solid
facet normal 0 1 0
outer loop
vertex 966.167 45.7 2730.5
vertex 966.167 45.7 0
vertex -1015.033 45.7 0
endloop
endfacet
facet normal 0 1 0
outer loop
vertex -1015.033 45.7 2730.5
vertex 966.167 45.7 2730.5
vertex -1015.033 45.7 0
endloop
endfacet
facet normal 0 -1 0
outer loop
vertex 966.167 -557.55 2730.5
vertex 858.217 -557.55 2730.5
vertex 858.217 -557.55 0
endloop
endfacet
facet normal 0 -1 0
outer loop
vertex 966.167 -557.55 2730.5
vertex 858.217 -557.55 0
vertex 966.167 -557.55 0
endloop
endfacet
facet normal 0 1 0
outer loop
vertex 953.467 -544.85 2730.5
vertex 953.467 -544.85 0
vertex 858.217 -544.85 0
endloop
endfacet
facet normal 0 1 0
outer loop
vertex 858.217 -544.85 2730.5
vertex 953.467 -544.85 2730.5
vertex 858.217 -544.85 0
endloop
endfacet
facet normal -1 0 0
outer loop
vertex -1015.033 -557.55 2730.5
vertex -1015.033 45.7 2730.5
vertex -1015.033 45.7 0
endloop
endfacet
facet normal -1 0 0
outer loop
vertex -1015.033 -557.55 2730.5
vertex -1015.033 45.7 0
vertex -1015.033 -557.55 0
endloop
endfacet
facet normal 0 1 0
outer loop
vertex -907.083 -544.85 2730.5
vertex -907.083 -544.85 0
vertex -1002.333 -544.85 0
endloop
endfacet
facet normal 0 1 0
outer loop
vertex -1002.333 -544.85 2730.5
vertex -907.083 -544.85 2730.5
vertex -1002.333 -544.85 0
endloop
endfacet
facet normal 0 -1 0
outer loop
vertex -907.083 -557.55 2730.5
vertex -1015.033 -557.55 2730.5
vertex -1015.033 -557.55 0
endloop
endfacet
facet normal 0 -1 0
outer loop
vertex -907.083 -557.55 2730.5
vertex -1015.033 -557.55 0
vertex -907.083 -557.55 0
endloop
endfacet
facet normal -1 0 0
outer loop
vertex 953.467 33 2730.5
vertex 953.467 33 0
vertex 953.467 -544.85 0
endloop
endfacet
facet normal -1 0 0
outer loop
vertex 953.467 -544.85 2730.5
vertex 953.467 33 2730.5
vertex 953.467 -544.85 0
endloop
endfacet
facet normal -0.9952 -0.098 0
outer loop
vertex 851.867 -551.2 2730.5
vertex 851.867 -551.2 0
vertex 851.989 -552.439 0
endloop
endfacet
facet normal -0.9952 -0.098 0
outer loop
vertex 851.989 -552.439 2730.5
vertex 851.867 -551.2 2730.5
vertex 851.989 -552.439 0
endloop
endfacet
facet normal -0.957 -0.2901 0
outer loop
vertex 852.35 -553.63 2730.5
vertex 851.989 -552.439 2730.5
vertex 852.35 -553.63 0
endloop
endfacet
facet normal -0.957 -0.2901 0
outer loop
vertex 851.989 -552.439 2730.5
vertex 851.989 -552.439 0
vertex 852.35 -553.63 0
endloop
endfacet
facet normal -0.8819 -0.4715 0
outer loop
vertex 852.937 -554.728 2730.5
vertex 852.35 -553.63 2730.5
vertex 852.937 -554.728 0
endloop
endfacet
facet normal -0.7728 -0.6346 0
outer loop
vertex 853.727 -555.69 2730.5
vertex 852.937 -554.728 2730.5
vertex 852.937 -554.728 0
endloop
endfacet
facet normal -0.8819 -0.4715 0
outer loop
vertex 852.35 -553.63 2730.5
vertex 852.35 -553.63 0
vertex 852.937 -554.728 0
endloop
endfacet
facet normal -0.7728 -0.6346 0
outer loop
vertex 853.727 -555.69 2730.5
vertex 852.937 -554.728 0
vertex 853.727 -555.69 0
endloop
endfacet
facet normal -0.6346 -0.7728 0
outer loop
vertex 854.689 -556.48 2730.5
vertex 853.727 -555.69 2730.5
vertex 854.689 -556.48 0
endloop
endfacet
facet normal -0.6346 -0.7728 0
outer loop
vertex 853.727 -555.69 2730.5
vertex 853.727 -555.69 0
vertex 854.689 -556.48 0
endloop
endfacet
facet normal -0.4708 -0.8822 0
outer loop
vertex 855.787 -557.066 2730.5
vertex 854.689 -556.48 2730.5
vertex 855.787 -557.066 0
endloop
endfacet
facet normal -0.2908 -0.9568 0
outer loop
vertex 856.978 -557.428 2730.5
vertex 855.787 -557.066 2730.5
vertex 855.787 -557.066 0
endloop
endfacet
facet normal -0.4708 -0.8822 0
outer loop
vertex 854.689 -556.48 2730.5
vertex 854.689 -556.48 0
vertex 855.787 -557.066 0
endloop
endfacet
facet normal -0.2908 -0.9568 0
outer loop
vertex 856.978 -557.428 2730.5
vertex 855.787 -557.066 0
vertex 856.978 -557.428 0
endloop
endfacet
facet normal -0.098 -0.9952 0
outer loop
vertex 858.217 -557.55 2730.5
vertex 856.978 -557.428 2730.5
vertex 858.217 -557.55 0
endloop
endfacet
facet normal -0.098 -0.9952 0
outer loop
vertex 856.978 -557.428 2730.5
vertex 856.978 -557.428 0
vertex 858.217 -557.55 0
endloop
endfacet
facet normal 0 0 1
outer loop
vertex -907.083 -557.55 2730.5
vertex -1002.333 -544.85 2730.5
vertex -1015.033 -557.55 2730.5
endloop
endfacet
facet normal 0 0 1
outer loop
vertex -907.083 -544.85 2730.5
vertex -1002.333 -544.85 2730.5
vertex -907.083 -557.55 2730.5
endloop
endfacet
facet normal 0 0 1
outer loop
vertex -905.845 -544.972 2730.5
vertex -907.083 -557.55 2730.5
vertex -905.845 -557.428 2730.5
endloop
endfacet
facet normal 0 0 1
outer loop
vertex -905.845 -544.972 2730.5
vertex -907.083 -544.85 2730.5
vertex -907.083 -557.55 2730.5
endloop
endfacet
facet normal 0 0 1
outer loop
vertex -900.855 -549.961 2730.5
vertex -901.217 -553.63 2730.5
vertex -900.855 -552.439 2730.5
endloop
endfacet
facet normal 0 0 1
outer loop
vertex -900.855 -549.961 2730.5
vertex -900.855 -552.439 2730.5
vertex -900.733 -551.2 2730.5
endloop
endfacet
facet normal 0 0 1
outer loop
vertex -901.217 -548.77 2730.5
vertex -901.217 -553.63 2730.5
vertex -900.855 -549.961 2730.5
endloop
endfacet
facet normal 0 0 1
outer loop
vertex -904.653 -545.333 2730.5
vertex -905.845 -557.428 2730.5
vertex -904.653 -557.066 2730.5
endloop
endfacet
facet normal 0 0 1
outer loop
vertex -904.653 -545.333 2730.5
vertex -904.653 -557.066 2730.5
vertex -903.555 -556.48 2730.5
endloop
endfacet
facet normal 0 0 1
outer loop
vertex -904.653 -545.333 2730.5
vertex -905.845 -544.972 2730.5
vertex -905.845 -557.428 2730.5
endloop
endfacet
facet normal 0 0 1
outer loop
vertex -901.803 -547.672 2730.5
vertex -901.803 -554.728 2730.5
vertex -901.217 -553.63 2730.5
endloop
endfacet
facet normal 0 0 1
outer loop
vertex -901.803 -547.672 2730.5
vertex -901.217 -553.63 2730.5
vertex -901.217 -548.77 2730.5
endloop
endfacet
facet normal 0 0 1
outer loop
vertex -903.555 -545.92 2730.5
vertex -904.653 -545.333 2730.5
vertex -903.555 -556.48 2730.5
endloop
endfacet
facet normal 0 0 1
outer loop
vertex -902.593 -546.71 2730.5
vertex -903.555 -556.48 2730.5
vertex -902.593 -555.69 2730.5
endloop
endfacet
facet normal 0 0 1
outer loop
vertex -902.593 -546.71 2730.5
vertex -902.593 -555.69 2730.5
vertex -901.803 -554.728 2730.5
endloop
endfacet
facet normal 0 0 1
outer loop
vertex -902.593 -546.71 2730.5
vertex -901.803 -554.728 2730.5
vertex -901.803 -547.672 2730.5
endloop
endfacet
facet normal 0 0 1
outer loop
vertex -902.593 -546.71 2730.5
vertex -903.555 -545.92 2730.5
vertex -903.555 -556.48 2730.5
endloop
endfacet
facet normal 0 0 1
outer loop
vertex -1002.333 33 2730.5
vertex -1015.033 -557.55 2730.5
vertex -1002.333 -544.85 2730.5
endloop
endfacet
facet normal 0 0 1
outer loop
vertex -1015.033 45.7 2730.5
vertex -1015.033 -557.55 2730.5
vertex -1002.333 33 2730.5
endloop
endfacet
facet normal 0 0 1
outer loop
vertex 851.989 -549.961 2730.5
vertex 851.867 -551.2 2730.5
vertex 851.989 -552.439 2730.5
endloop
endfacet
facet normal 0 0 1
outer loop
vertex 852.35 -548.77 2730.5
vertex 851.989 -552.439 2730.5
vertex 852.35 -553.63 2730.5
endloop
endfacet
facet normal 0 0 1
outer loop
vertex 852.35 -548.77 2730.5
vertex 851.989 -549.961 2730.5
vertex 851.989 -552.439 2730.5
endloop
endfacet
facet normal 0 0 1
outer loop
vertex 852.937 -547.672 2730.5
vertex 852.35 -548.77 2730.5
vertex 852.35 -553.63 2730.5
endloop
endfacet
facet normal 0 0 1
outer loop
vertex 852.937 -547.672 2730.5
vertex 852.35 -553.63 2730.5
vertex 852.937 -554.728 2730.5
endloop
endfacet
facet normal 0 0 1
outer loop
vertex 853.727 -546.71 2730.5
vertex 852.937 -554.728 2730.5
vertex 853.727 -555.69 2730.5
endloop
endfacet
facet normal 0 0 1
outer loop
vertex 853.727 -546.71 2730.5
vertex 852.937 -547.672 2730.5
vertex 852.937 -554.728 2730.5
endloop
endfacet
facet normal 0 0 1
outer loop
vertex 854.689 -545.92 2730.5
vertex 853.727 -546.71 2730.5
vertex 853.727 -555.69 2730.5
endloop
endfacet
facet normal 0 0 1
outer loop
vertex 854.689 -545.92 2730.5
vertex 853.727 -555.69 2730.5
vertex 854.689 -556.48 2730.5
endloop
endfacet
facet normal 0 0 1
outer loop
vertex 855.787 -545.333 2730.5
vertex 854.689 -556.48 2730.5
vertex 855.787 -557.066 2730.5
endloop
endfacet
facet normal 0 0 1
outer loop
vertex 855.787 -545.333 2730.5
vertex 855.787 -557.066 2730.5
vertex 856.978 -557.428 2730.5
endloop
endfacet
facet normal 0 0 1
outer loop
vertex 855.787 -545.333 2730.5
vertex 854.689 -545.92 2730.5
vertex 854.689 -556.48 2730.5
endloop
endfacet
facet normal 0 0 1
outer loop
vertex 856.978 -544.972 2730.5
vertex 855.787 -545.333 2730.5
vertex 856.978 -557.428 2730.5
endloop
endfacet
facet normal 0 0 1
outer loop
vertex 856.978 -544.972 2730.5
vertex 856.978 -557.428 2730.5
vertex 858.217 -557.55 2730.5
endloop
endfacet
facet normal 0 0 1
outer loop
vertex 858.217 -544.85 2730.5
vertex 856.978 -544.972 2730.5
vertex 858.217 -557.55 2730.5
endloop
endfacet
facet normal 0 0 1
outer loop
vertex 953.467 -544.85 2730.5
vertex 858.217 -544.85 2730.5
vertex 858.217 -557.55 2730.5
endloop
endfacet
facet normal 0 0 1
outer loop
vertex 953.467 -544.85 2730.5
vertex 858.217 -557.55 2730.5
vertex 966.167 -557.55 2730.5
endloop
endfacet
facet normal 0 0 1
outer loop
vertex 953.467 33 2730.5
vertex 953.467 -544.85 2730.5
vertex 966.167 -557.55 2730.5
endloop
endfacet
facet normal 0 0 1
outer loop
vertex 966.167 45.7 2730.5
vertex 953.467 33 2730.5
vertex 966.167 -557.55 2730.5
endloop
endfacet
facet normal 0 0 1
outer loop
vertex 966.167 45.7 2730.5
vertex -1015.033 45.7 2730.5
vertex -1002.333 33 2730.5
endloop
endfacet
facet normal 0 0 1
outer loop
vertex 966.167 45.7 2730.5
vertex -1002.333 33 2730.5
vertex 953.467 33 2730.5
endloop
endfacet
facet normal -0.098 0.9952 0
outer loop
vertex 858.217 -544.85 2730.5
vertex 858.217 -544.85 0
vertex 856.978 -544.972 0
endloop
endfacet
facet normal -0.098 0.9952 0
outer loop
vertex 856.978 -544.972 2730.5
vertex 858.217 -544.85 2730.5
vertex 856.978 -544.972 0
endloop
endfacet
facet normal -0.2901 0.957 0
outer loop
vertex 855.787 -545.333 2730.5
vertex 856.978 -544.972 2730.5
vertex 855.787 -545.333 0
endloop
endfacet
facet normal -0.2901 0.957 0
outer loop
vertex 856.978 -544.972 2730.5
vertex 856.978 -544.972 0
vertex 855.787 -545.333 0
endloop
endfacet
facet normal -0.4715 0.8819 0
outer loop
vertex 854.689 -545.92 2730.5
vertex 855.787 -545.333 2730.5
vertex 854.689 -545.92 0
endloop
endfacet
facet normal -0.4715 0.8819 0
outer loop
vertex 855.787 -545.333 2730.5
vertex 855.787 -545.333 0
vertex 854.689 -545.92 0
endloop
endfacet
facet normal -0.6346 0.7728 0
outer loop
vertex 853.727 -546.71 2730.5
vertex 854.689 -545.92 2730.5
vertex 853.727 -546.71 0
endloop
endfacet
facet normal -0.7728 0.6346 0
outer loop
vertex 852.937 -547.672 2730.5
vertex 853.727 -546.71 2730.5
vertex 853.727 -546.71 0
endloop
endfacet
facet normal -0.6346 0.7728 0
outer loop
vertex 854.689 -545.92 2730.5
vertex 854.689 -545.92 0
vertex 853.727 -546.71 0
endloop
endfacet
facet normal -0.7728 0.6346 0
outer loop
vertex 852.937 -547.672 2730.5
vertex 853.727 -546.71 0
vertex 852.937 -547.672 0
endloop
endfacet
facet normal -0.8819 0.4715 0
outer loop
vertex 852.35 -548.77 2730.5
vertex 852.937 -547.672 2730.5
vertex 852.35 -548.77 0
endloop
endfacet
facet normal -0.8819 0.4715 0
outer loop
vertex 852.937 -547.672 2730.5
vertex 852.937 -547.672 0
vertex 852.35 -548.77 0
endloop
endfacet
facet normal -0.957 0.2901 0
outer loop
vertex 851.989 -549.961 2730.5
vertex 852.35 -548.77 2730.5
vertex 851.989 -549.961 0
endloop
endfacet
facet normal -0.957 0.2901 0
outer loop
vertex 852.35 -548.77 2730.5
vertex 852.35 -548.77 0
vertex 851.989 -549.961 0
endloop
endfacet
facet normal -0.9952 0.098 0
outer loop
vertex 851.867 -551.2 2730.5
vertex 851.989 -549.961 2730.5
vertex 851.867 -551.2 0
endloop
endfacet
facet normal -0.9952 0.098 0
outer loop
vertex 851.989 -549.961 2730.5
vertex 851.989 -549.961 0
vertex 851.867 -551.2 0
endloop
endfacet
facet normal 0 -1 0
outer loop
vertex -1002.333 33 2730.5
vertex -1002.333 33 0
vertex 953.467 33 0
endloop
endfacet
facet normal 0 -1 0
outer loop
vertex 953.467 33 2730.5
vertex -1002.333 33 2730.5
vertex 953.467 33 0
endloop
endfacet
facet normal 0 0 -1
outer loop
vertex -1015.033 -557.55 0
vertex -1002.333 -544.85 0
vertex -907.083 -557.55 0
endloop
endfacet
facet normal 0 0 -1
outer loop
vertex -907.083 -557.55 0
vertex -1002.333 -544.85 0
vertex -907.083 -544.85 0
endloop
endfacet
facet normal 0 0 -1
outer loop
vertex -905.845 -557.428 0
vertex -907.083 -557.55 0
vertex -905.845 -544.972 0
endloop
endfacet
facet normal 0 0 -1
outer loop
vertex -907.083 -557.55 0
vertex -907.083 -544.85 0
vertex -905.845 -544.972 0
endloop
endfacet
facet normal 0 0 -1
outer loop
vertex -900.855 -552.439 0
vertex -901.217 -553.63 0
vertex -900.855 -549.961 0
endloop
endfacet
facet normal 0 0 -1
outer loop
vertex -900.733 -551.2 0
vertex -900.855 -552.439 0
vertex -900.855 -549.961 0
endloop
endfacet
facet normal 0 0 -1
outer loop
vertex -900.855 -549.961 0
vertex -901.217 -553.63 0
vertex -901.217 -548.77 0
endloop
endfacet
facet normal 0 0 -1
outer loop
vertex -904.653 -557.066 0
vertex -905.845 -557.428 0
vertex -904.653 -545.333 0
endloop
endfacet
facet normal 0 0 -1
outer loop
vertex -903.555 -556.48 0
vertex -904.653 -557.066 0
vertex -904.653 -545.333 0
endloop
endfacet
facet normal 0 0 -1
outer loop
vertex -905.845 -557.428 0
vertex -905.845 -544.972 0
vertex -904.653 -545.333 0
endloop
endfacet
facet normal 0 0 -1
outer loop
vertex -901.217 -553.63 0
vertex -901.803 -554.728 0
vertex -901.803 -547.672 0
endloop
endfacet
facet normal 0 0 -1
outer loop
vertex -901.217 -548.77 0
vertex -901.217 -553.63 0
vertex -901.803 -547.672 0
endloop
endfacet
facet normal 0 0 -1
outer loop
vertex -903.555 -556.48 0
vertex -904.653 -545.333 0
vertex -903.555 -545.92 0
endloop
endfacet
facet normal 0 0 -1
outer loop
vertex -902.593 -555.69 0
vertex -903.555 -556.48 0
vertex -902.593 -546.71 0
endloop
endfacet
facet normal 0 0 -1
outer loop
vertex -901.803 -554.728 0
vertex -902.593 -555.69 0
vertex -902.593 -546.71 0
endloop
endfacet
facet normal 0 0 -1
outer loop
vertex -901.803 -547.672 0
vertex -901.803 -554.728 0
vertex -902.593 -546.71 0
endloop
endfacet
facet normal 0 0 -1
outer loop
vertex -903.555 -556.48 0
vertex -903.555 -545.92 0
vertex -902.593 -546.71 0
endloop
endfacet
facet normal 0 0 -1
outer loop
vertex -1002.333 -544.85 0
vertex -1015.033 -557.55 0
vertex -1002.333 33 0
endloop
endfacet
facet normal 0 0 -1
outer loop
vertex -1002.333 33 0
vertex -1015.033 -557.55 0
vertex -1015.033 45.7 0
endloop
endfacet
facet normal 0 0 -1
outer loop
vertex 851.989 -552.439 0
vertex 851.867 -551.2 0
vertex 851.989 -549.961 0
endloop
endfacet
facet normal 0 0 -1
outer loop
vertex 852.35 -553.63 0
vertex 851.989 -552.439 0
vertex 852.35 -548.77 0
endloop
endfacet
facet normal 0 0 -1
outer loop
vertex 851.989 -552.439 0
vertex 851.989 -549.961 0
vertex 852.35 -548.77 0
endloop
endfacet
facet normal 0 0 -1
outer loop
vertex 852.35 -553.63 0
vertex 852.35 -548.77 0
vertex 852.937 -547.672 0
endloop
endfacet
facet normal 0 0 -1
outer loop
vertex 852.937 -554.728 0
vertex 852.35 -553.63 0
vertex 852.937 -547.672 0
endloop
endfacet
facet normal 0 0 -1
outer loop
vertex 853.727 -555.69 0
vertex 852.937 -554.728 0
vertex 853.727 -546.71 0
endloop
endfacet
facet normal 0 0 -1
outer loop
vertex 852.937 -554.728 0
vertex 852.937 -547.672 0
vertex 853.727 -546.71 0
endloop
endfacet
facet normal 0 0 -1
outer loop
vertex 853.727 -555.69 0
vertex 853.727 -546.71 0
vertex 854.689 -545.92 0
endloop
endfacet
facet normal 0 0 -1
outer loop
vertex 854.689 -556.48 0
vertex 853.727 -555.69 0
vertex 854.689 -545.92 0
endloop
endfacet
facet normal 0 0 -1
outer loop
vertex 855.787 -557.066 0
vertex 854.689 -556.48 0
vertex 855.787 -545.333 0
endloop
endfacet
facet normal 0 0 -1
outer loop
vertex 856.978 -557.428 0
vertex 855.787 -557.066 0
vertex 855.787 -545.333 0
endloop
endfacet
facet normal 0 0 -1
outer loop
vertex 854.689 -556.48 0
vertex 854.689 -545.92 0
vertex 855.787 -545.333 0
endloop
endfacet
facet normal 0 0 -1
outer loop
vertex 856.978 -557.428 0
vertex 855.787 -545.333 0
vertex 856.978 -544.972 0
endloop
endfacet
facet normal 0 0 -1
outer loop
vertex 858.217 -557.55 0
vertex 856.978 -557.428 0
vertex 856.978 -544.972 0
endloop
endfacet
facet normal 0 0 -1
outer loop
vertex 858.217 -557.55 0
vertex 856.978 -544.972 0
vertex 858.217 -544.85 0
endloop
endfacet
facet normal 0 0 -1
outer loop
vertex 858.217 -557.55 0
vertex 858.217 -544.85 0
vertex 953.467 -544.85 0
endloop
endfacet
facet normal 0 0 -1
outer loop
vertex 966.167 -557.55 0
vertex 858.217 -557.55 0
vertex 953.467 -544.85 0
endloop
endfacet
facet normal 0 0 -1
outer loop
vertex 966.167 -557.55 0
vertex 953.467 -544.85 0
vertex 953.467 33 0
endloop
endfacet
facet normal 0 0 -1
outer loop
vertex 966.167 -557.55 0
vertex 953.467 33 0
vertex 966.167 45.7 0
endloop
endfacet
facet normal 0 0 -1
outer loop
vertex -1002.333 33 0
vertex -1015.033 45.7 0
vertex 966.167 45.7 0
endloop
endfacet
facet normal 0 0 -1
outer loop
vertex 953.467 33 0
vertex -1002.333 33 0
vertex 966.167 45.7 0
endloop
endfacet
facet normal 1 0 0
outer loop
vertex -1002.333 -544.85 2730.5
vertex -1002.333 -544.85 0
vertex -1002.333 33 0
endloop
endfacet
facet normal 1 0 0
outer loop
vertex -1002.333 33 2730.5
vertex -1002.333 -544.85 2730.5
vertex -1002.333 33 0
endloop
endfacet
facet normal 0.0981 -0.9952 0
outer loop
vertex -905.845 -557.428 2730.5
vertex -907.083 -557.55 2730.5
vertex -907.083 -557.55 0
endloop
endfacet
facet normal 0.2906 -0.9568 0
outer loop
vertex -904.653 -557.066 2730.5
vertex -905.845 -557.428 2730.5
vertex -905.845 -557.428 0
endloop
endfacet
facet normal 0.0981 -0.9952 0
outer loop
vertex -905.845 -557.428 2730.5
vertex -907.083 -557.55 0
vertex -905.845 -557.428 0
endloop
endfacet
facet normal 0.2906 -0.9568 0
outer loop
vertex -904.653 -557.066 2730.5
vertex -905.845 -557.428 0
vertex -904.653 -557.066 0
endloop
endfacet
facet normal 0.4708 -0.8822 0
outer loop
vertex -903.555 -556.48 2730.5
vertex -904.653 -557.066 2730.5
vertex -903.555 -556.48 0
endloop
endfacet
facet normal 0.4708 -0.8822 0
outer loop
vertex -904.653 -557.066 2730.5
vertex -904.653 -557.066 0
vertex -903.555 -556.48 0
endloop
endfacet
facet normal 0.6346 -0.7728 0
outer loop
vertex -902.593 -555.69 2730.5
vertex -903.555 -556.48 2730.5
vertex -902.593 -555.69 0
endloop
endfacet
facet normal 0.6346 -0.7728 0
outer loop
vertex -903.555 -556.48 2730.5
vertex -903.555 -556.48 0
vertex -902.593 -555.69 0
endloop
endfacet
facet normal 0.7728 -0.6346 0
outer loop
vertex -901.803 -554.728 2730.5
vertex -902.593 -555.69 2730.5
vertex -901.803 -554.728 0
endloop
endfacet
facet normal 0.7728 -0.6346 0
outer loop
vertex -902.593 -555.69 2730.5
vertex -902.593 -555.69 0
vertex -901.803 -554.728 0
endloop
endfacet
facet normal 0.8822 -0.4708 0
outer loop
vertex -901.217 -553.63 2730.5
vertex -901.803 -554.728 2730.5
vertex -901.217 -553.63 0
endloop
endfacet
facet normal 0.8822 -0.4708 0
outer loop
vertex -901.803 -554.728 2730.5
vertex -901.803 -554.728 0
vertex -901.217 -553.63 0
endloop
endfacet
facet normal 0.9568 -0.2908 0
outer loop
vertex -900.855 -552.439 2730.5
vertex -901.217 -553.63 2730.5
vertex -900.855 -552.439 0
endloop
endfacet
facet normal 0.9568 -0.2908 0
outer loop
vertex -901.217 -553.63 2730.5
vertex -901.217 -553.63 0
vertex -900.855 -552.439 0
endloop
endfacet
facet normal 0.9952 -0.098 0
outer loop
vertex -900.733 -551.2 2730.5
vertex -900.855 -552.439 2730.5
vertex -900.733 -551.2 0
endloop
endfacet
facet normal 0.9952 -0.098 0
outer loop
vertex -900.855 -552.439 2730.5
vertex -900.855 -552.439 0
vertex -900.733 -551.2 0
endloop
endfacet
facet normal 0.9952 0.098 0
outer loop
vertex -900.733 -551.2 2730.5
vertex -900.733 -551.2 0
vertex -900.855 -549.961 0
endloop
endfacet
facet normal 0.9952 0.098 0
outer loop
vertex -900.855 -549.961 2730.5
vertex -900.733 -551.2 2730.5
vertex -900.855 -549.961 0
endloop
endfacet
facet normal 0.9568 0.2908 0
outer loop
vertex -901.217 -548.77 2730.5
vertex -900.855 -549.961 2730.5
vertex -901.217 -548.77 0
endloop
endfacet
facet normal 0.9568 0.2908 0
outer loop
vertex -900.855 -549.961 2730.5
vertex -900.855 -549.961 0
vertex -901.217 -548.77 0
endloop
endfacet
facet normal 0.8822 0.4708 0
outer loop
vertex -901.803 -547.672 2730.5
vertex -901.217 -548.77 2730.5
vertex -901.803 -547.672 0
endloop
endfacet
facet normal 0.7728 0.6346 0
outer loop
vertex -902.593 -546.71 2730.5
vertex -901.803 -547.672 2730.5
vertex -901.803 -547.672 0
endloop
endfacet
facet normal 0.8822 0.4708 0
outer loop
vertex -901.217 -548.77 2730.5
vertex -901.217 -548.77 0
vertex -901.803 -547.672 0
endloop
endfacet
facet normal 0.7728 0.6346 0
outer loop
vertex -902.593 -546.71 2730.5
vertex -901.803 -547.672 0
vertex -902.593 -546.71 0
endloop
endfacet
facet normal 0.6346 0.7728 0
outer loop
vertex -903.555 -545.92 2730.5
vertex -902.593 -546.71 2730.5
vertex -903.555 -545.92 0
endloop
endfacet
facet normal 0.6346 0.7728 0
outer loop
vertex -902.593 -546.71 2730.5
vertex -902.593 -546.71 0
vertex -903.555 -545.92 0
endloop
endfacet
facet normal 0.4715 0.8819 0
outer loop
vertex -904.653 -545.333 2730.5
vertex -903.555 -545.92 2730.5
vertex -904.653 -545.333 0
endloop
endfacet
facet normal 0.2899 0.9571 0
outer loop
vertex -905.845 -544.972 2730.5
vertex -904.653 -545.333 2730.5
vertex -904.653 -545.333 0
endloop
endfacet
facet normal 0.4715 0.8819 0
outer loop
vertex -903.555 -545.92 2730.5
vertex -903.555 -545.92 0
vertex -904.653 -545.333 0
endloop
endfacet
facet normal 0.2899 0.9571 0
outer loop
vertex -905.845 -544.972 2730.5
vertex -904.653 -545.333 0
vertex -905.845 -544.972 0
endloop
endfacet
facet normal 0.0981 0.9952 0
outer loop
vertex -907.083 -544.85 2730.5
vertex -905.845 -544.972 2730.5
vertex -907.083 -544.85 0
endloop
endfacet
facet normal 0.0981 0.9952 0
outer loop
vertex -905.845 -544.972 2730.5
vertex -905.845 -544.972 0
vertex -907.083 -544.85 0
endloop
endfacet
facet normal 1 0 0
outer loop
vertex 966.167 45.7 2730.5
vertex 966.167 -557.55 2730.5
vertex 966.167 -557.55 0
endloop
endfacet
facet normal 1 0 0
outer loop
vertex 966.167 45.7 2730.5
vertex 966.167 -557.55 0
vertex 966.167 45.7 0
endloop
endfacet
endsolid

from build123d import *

# Parameters (mm, degrees)
F1_DEPTH = 2730.5


with BuildPart() as f1:
    # F0 (on Top) → F1 (new body)
    with BuildSketch(Plane.XY):
        with BuildLine():
            Line((-1002.333329, -544.849776), (-1002.333329, 33.000224))
            Line((-1002.333329, 33.000224), (953.466671, 33.000224))
            Line((953.466671, 33.000224), (953.466671, -544.849776))
            Line((953.466671, -544.849776), (858.216671, -544.849776))
            ThreePointArc((858.216671, -544.849776), (853.726543, -546.709648), (851.866671, -551.199776))
            ThreePointArc((851.866671, -551.199776), (853.726543, -555.689904), (858.216671, -557.549776))
            Line((858.216671, -557.549776), (953.466671, -557.549776))
            Line((953.466671, -557.549776), (966.166671, -557.549776))
            Line((966.166671, -557.549776), (966.166671, -544.849776))
            Line((966.166671, -544.849776), (966.166671, 33.000224))
            Line((966.166671, 33.000224), (966.166671, 45.700224))
            Line((966.166671, 45.700224), (953.466671, 45.700224))
            Line((953.466671, 45.700224), (-1002.333329, 45.700224))
            Line((-1002.333329, 45.700224), (-1015.033329, 45.700224))
            Line((-1015.033329, 45.700224), (-1015.033329, 33.000224))
            Line((-1015.033329, 33.000224), (-1015.033329, -544.849776))
            Line((-1015.033329, -544.849776), (-1015.033329, -557.549776))
            Line((-1015.033329, -557.549776), (-1002.333329, -557.549776))
            Line((-1002.333329, -557.549776), (-907.083329, -557.549776))
            ThreePointArc((-907.083329, -557.549776), (-902.593201, -555.689904), (-900.733329, -551.199776))
            ThreePointArc((-900.733329, -551.199776), (-902.593201, -546.709648), (-907.083329, -544.849776))
            Line((-907.083329, -544.849776), (-1002.333329, -544.849776))
        make_face()
    extrude(amount=F1_DEPTH)


solid = f1.part
